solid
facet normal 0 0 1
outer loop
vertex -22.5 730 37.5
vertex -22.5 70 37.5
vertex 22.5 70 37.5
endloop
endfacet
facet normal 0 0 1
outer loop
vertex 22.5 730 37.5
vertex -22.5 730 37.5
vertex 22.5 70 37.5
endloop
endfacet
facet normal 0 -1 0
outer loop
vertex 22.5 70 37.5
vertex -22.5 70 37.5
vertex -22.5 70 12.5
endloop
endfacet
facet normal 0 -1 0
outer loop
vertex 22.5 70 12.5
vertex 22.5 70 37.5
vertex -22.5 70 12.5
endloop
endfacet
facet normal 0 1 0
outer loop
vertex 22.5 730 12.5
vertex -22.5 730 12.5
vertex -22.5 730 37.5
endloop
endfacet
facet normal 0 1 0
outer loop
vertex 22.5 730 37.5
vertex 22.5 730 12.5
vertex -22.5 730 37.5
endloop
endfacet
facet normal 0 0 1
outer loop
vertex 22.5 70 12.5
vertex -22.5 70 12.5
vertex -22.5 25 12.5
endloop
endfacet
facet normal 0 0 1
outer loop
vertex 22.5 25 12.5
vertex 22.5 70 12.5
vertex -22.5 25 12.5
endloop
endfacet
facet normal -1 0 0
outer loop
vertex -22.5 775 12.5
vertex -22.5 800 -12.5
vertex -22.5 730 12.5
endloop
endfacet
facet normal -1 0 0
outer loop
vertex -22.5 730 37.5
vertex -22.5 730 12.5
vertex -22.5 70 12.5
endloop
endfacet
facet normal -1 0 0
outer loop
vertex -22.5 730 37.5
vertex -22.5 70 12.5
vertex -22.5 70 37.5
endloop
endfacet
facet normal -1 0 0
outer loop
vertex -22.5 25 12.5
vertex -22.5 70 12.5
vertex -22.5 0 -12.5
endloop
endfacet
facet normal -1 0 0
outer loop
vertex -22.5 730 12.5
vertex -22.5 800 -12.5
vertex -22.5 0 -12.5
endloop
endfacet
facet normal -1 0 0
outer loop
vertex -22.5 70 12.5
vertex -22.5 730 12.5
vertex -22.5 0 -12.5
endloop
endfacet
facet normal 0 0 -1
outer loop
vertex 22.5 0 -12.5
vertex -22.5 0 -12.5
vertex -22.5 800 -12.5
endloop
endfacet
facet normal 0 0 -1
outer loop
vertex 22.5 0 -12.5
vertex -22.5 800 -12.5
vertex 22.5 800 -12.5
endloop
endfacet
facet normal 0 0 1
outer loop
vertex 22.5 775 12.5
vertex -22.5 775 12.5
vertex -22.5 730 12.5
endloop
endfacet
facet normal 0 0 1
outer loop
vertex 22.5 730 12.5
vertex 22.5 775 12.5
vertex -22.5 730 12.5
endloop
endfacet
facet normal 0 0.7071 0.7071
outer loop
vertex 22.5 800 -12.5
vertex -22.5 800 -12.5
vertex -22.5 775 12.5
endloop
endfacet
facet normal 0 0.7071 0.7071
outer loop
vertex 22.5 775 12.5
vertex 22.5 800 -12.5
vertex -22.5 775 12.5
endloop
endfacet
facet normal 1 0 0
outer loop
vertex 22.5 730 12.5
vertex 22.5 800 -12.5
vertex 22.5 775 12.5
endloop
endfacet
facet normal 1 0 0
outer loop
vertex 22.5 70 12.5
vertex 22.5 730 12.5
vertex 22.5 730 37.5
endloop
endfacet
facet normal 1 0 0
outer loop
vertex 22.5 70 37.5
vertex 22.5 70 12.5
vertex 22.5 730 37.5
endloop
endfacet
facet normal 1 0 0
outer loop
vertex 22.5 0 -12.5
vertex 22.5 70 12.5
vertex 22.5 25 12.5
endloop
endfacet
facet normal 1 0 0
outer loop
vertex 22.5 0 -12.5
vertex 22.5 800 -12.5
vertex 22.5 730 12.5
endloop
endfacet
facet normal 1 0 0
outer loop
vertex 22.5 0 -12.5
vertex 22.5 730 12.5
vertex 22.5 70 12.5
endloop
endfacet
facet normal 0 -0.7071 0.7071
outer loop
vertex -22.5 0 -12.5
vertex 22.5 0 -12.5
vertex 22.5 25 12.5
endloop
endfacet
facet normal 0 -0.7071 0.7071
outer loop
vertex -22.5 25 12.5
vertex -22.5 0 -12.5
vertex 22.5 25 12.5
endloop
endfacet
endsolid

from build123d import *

# Parameters (mm, degrees)
F0_W      = 45
F0_H      = 25
F1_DEPTH  = 800
F3_DEPTH  = 45
F5_DEPTH  = 45
F6_W      = 45
F6_H      = 25
F7_DEPTH  = 800
F9_DEPTH  = 45
F11_DEPTH = 45


with BuildPart() as f1:
    # F0 (on Front) → F1 (new body)
    with BuildSketch(Plane.XZ):
        Rectangle(F0_W, F0_H)
    extrude(amount=-F1_DEPTH)

    # F2 (on face) → F3 (cut)
    with BuildSketch(Plane.YZ.offset(22.5)):
        Polygon((0, 12.5), (0, -12.5), (25, 12.5), align=None)
    extrude(amount=-F3_DEPTH, mode=Mode.SUBTRACT)

    # F4 (on face) → F5 (cut)
    with BuildSketch(Plane(origin=(-22.5, 0, 0), x_dir=(0, -1, 0), z_dir=(-1, 0, 0))):
        Polygon((-800, 12.5), (-800, -12.5), (-775, 12.5), align=None)
    extrude(amount=-F5_DEPTH, mode=Mode.SUBTRACT)

    # F6 (on Front) → F7 (join)
    with BuildSketch(Plane.XZ):
        with Locations((0, 25)):
            Rectangle(F6_W, F6_H)
    extrude(amount=-F7_DEPTH)

    # F8 (on face) → F9 (cut)
    with BuildSketch(Plane(origin=(-22.5, 0, 0), x_dir=(0, -1, 0), z_dir=(-1, 0, 0))):
        Polygon((-730, 37.5), (-800, 37.5), (-800, 12.5), (-775, 12.5), (-730, 12.5), align=None)
    extrude(amount=-F9_DEPTH, mode=Mode.SUBTRACT)

    # F10 (on face) → F11 (cut)
    with BuildSketch(Plane(origin=(-22.5, 0, 0), x_dir=(0, -1, 0), z_dir=(-1, 0, 0))):
        Polygon((0, 12.5), (0, 37.5), (-70, 37.5), (-70, 12.5), (-25, 12.5), align=None)
    extrude(amount=-F11_DEPTH, mode=Mode.SUBTRACT)


solid = f1.part
